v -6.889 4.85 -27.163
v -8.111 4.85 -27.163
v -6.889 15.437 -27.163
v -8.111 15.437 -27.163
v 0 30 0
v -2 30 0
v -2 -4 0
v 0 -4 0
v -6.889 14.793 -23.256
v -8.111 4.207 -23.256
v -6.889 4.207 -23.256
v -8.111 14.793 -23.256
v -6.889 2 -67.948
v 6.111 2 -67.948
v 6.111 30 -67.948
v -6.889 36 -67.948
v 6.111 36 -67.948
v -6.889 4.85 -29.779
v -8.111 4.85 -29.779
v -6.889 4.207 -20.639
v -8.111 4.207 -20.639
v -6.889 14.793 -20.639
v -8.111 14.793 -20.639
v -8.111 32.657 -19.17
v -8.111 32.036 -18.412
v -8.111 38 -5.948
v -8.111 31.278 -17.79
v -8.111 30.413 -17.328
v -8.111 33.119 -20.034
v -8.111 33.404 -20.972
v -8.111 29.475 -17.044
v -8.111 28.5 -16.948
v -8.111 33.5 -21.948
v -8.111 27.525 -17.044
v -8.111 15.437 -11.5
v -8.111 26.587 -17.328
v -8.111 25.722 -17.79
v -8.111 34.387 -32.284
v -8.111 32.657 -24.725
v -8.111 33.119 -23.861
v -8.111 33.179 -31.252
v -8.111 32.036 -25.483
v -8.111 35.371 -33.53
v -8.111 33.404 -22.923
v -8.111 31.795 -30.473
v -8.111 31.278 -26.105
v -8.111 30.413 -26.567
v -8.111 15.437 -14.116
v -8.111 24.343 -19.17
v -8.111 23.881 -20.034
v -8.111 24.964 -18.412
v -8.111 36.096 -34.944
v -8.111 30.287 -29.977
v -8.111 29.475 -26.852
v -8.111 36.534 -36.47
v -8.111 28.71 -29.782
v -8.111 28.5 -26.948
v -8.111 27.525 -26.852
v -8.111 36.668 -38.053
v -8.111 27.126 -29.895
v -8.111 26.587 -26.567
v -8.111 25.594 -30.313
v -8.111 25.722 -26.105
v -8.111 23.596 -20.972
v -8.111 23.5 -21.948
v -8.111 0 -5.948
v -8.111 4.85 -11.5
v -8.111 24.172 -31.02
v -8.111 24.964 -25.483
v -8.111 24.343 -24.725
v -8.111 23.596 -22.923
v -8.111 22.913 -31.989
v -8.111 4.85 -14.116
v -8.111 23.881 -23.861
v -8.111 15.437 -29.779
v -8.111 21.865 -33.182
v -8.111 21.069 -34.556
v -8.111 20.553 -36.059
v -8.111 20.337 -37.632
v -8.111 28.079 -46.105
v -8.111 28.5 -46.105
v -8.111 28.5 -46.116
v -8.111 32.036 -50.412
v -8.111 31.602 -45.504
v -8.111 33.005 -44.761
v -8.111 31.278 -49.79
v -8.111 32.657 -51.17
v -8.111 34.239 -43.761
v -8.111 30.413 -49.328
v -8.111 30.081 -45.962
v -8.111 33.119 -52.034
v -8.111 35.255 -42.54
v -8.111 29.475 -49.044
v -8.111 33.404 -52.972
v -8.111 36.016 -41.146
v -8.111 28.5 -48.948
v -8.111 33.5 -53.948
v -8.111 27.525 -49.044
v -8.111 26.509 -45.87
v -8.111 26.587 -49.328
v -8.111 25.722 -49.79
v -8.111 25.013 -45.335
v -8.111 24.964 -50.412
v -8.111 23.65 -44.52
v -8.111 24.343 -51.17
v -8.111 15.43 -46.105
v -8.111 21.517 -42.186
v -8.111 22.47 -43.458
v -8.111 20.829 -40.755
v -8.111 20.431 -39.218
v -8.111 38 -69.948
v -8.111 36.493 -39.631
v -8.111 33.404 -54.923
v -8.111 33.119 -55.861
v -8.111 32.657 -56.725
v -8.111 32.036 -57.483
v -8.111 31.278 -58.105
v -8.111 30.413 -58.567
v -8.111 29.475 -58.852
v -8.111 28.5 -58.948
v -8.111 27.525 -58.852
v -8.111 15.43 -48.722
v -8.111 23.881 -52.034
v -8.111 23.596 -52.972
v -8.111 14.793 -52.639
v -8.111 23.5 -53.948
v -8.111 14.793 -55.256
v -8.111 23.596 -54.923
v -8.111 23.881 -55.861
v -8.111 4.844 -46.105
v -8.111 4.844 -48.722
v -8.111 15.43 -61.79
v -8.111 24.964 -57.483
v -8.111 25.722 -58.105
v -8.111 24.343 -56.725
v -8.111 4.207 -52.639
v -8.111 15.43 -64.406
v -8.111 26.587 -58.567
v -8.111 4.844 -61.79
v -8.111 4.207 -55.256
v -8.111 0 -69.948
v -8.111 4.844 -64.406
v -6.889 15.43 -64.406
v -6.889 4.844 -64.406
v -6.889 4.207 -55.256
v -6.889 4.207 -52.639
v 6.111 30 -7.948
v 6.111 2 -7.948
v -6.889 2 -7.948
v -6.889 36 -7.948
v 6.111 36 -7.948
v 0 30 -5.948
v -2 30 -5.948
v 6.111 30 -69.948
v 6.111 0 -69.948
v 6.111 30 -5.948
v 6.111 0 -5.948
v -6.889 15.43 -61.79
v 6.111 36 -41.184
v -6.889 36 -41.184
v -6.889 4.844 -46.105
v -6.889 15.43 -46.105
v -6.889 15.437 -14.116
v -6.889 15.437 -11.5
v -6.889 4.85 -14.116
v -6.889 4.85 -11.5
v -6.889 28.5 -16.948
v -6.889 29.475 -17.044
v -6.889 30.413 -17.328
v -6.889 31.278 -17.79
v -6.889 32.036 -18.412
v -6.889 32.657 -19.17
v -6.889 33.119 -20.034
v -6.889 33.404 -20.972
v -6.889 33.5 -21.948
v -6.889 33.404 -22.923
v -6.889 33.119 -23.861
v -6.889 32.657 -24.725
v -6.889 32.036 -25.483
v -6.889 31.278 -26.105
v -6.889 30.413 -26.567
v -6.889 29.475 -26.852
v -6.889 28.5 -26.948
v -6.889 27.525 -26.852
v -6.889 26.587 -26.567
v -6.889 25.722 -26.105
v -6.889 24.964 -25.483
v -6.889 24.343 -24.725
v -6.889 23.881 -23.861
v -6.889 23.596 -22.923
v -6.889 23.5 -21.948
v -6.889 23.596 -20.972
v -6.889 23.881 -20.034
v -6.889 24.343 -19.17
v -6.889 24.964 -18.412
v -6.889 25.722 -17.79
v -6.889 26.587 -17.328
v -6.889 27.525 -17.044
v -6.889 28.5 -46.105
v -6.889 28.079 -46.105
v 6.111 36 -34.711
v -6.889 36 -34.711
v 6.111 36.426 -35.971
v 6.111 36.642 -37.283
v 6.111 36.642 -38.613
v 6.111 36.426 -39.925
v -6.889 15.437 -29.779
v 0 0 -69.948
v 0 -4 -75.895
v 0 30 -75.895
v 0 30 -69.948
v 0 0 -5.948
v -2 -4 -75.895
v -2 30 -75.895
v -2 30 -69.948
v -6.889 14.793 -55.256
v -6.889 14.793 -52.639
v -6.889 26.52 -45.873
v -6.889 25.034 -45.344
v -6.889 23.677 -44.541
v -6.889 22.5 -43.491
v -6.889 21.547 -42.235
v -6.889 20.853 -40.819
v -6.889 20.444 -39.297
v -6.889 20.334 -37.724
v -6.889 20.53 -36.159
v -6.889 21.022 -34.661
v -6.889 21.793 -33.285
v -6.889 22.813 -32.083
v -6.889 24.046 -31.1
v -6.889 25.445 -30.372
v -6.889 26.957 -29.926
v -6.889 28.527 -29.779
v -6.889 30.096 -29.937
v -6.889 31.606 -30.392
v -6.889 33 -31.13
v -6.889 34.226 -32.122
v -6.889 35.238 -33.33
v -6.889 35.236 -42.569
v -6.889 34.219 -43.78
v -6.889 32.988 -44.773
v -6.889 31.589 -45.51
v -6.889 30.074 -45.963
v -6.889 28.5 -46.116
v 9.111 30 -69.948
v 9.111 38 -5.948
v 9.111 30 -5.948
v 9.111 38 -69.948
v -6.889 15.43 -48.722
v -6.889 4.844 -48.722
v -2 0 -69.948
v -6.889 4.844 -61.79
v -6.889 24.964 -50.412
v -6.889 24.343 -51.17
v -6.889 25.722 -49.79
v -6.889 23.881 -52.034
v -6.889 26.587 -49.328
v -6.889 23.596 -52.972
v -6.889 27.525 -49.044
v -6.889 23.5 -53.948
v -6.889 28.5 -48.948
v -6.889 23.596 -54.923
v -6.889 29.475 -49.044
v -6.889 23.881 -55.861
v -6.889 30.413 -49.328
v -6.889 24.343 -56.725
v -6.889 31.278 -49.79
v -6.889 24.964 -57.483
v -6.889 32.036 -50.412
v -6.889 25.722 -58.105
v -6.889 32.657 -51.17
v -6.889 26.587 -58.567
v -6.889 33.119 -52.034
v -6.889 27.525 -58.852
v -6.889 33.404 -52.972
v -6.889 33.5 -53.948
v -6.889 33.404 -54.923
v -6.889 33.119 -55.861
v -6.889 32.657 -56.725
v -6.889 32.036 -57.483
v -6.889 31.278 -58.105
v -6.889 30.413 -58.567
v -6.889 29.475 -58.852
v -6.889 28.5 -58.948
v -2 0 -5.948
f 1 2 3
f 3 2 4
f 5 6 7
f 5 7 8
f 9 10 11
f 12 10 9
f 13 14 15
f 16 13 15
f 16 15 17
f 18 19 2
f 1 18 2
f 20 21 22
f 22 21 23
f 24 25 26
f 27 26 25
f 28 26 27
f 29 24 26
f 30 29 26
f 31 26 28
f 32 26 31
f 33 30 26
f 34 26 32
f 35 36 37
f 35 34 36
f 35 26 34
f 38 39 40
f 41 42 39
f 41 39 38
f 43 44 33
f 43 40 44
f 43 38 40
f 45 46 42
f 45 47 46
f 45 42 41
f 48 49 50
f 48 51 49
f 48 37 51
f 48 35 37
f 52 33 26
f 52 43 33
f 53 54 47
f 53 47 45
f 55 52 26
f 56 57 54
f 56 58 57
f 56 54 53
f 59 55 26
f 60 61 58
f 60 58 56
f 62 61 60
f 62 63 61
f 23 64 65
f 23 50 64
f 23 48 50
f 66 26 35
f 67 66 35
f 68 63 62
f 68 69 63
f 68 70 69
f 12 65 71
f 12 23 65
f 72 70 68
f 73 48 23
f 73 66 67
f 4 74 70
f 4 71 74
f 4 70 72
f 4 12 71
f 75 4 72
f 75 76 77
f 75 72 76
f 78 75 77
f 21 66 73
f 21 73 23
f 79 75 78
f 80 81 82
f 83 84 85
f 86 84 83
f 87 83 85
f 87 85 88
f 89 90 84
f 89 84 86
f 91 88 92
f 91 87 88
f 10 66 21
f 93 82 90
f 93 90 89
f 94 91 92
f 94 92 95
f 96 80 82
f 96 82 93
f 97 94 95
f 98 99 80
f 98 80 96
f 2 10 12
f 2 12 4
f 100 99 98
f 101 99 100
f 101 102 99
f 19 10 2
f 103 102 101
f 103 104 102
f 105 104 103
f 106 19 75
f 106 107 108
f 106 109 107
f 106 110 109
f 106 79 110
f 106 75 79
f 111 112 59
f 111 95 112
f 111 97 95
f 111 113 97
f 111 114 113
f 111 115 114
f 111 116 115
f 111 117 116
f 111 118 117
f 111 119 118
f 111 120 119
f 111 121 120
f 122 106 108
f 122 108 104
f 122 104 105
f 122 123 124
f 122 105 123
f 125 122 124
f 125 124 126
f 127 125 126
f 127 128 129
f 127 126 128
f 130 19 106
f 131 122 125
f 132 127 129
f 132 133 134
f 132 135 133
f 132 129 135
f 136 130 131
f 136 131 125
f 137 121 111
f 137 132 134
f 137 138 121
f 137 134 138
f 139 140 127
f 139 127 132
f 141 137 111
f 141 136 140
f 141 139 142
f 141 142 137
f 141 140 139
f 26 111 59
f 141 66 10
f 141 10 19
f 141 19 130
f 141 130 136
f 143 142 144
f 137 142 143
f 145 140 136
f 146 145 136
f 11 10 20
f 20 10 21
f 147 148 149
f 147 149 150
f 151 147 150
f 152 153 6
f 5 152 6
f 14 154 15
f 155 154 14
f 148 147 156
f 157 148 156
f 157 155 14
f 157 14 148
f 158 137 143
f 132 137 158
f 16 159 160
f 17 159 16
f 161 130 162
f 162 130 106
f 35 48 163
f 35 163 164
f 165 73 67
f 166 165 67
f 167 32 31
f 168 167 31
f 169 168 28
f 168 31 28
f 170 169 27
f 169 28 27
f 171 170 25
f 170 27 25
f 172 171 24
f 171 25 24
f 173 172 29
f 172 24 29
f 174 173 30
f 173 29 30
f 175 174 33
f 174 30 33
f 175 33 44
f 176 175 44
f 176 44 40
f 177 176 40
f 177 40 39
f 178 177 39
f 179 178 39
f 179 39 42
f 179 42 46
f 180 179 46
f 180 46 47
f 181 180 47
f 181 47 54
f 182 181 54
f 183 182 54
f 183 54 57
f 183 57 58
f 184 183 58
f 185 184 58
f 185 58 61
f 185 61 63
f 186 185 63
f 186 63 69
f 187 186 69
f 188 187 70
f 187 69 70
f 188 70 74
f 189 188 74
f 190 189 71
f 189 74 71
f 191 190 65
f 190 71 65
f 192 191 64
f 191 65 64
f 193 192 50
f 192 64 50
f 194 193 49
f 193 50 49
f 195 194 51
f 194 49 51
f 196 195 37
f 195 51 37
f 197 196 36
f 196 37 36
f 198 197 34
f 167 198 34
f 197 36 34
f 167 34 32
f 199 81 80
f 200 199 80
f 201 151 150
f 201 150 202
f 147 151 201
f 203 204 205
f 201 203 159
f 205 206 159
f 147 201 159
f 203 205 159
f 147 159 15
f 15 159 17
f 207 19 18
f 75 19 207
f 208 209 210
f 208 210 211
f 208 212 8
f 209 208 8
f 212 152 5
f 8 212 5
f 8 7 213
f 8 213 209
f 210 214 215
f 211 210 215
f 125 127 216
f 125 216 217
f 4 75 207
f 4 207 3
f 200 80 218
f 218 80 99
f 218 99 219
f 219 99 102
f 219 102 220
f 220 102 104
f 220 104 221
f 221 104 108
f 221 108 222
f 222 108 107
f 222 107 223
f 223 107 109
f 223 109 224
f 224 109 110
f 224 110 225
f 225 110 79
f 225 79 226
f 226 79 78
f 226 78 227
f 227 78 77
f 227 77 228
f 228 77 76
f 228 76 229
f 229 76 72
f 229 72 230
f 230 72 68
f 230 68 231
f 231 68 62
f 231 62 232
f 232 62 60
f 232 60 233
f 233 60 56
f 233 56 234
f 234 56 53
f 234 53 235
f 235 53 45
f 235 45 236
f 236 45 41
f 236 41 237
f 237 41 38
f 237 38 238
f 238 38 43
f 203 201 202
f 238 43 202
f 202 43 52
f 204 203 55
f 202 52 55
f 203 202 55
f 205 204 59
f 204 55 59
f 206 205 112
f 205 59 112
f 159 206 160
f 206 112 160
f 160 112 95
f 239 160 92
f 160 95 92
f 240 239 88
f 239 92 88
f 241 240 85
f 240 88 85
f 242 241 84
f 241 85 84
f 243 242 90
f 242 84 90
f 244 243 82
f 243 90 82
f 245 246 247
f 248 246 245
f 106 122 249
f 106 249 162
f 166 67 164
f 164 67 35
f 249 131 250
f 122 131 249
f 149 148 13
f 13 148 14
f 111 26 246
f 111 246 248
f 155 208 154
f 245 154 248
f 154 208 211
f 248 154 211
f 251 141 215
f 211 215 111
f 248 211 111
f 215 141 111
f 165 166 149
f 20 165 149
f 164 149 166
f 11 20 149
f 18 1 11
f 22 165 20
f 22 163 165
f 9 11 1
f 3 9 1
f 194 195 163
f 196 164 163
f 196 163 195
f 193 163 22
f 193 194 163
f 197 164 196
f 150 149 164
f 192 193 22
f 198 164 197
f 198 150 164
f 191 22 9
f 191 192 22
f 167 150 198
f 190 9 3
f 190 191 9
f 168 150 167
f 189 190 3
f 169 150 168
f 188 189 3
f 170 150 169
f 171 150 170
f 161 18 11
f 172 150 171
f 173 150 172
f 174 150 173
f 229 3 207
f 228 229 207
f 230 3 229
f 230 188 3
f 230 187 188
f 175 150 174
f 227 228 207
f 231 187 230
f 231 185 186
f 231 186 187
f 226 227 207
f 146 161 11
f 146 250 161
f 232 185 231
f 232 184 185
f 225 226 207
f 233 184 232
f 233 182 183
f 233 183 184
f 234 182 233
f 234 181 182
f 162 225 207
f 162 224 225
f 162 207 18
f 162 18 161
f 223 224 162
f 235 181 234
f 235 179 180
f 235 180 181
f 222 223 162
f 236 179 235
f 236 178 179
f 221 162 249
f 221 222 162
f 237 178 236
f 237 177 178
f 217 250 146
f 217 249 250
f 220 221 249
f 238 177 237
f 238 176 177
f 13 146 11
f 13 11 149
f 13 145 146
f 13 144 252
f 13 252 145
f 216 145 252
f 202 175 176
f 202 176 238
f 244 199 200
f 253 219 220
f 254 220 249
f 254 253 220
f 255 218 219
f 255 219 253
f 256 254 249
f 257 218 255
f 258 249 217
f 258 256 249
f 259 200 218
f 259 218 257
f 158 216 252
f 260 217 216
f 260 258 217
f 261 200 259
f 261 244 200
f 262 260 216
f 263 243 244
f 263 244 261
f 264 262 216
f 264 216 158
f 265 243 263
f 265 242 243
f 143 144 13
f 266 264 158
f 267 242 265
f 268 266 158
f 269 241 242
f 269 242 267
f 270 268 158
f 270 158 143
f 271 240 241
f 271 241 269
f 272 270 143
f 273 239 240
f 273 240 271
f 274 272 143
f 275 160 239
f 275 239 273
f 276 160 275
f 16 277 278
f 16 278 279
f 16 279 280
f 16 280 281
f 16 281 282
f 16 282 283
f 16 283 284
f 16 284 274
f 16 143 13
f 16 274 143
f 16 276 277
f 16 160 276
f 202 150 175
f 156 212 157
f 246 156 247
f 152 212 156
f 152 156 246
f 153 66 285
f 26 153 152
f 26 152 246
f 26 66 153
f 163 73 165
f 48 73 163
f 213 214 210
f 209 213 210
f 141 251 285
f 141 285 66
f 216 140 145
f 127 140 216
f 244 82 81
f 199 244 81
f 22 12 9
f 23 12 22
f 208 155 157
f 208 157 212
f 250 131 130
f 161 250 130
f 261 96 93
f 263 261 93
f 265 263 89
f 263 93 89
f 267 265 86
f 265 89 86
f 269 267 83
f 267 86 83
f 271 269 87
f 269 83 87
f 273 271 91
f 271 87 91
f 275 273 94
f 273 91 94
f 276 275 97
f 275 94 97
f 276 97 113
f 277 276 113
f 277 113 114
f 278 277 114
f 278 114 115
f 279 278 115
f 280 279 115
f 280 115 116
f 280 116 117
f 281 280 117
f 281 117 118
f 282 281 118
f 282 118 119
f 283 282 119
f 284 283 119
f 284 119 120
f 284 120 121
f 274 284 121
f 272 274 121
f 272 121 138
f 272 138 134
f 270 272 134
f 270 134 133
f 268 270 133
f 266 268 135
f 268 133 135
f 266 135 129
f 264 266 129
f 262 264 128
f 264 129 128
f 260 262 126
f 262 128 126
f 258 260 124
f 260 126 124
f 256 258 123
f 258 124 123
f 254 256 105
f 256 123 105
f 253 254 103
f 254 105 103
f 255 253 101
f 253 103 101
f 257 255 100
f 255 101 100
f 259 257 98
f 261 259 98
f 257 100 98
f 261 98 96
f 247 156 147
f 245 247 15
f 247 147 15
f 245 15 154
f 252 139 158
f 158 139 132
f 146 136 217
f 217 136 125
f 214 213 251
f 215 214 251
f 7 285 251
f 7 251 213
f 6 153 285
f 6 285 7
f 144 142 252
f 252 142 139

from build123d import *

# Parameters (mm, degrees)
EXTRUDE_1_DEPTH     = 38
SKETCH_2_W          = 60
SKETCH_2_H          = 34
CUT_EXTRUDE_1_DEPTH = 13
SKETCH_3_R          = 5
SKETCH_3_W          = 2.616489735
SKETCH_3_H          = 10.586779654
SKETCH_3_W_2        = 2.616489734
CUT_EXTRUDE_4_DEPTH = 31
SKETCH_4_W          = 2
SKETCH_4_H          = 75.8952895
EXTRUDE_3_DEPTH     = 4
SKETCH_5_W          = 5.94764475
SKETCH_5_H          = 8
CUT_EXTRUDE_5_DEPTH = 4
SKETCH_6_W          = 64
SKETCH_6_H          = 8
EXTRUDE_4_DEPTH     = 3


with BuildPart() as part:
    # 草图1 → 凸台-拉伸1 (new body)
    with BuildSketch(Plane(origin=(0, 0, 0), x_dir=(1, 0, 0), z_dir=(0, 1, 0))):
        Polygon((-2, 75.8952895), (0, 75.8952895), (0, 69.94764475), (6.11103449, 69.94764475), (6.11103449, 5.94764475), (0, 5.94764475), (0, 0), (-2, 0), (-2, 5.94764475), (-8.11103449, 5.94764475), (-8.11103449, 69.94764475), (-2, 69.94764475), align=None)
    extrude(amount=EXTRUDE_1_DEPTH)

    # 草图2 → 切除-拉伸1 (cut)
    with BuildSketch(Plane(origin=(6.11103449, 0, 0), x_dir=(0, 0, -1), z_dir=(1, 0, 0))):
        with Locations((37.94764475, 19)):
            Rectangle(SKETCH_2_W, SKETCH_2_H)
    extrude(amount=-CUT_EXTRUDE_1_DEPTH, mode=Mode.SUBTRACT)

    # 草图3 → 切除-拉伸4 (cut)
    with BuildSketch(Plane.ZY.offset(8.11103449)):
        with Locations((-53.94764475, 28.5)):
            Circle(SKETCH_3_R)
        with Locations((-63.098105483, 10.137074157)):
            Rectangle(SKETCH_3_W, SKETCH_3_H)
        with Locations((-47.413673753, 10.137074157)):
            Rectangle(SKETCH_3_W, SKETCH_3_H)
        with BuildLine():
            ThreePointArc((-46.105428885, 28.079391153), (-29.781734116, 28.710374202), (-46.116264816, 28.5))
            Line((-46.116264816, 28.5), (-46.105428885, 28.5))
            Line((-46.105428885, 28.5), (-46.105428885, 28.079391153))
        make_face()
        with Locations((-28.470779817, 10.143507991)):
            Rectangle(SKETCH_3_W, SKETCH_3_H)
        with Locations((-53.94764475, 9.5)):
            Rectangle(SKETCH_3_W_2, SKETCH_3_H)
        with Locations((-21.94764475, 28.5)):
            Circle(SKETCH_3_R)
        with Locations((-12.808019949, 10.143507991)):
            Rectangle(SKETCH_3_W_2, SKETCH_3_H)
        with Locations((-21.94764475, 9.5)):
            Rectangle(SKETCH_3_W_2, SKETCH_3_H)
    extrude(amount=-CUT_EXTRUDE_4_DEPTH, mode=Mode.SUBTRACT)

    # 草图4 → 凸台-拉伸3 (add)
    with BuildSketch(Plane.XZ):
        with Locations((-1, -37.94764475)):
            Rectangle(SKETCH_4_W, SKETCH_4_H)
    extrude(amount=EXTRUDE_3_DEPTH)

    # 草图5 → 切除-拉伸5 (cut)
    with BuildSketch(Plane.ZY.offset(2)):
        with Locations((-72.921467125, 34)):
            Rectangle(SKETCH_5_W, SKETCH_5_H)
        with Locations((-2.973822375, 34)):
            Rectangle(SKETCH_5_W, SKETCH_5_H)
    extrude(amount=-CUT_EXTRUDE_5_DEPTH, mode=Mode.SUBTRACT)

    # 草图6 → 凸台-拉伸4 (add)
    with BuildSketch(Plane(origin=(6.11103449, 0, 0), x_dir=(0, 0, -1), z_dir=(1, 0, 0))):
        with Locations((37.94764475, 34)):
            Rectangle(SKETCH_6_W, SKETCH_6_H)
    extrude(amount=EXTRUDE_4_DEPTH)


solid = part.part
